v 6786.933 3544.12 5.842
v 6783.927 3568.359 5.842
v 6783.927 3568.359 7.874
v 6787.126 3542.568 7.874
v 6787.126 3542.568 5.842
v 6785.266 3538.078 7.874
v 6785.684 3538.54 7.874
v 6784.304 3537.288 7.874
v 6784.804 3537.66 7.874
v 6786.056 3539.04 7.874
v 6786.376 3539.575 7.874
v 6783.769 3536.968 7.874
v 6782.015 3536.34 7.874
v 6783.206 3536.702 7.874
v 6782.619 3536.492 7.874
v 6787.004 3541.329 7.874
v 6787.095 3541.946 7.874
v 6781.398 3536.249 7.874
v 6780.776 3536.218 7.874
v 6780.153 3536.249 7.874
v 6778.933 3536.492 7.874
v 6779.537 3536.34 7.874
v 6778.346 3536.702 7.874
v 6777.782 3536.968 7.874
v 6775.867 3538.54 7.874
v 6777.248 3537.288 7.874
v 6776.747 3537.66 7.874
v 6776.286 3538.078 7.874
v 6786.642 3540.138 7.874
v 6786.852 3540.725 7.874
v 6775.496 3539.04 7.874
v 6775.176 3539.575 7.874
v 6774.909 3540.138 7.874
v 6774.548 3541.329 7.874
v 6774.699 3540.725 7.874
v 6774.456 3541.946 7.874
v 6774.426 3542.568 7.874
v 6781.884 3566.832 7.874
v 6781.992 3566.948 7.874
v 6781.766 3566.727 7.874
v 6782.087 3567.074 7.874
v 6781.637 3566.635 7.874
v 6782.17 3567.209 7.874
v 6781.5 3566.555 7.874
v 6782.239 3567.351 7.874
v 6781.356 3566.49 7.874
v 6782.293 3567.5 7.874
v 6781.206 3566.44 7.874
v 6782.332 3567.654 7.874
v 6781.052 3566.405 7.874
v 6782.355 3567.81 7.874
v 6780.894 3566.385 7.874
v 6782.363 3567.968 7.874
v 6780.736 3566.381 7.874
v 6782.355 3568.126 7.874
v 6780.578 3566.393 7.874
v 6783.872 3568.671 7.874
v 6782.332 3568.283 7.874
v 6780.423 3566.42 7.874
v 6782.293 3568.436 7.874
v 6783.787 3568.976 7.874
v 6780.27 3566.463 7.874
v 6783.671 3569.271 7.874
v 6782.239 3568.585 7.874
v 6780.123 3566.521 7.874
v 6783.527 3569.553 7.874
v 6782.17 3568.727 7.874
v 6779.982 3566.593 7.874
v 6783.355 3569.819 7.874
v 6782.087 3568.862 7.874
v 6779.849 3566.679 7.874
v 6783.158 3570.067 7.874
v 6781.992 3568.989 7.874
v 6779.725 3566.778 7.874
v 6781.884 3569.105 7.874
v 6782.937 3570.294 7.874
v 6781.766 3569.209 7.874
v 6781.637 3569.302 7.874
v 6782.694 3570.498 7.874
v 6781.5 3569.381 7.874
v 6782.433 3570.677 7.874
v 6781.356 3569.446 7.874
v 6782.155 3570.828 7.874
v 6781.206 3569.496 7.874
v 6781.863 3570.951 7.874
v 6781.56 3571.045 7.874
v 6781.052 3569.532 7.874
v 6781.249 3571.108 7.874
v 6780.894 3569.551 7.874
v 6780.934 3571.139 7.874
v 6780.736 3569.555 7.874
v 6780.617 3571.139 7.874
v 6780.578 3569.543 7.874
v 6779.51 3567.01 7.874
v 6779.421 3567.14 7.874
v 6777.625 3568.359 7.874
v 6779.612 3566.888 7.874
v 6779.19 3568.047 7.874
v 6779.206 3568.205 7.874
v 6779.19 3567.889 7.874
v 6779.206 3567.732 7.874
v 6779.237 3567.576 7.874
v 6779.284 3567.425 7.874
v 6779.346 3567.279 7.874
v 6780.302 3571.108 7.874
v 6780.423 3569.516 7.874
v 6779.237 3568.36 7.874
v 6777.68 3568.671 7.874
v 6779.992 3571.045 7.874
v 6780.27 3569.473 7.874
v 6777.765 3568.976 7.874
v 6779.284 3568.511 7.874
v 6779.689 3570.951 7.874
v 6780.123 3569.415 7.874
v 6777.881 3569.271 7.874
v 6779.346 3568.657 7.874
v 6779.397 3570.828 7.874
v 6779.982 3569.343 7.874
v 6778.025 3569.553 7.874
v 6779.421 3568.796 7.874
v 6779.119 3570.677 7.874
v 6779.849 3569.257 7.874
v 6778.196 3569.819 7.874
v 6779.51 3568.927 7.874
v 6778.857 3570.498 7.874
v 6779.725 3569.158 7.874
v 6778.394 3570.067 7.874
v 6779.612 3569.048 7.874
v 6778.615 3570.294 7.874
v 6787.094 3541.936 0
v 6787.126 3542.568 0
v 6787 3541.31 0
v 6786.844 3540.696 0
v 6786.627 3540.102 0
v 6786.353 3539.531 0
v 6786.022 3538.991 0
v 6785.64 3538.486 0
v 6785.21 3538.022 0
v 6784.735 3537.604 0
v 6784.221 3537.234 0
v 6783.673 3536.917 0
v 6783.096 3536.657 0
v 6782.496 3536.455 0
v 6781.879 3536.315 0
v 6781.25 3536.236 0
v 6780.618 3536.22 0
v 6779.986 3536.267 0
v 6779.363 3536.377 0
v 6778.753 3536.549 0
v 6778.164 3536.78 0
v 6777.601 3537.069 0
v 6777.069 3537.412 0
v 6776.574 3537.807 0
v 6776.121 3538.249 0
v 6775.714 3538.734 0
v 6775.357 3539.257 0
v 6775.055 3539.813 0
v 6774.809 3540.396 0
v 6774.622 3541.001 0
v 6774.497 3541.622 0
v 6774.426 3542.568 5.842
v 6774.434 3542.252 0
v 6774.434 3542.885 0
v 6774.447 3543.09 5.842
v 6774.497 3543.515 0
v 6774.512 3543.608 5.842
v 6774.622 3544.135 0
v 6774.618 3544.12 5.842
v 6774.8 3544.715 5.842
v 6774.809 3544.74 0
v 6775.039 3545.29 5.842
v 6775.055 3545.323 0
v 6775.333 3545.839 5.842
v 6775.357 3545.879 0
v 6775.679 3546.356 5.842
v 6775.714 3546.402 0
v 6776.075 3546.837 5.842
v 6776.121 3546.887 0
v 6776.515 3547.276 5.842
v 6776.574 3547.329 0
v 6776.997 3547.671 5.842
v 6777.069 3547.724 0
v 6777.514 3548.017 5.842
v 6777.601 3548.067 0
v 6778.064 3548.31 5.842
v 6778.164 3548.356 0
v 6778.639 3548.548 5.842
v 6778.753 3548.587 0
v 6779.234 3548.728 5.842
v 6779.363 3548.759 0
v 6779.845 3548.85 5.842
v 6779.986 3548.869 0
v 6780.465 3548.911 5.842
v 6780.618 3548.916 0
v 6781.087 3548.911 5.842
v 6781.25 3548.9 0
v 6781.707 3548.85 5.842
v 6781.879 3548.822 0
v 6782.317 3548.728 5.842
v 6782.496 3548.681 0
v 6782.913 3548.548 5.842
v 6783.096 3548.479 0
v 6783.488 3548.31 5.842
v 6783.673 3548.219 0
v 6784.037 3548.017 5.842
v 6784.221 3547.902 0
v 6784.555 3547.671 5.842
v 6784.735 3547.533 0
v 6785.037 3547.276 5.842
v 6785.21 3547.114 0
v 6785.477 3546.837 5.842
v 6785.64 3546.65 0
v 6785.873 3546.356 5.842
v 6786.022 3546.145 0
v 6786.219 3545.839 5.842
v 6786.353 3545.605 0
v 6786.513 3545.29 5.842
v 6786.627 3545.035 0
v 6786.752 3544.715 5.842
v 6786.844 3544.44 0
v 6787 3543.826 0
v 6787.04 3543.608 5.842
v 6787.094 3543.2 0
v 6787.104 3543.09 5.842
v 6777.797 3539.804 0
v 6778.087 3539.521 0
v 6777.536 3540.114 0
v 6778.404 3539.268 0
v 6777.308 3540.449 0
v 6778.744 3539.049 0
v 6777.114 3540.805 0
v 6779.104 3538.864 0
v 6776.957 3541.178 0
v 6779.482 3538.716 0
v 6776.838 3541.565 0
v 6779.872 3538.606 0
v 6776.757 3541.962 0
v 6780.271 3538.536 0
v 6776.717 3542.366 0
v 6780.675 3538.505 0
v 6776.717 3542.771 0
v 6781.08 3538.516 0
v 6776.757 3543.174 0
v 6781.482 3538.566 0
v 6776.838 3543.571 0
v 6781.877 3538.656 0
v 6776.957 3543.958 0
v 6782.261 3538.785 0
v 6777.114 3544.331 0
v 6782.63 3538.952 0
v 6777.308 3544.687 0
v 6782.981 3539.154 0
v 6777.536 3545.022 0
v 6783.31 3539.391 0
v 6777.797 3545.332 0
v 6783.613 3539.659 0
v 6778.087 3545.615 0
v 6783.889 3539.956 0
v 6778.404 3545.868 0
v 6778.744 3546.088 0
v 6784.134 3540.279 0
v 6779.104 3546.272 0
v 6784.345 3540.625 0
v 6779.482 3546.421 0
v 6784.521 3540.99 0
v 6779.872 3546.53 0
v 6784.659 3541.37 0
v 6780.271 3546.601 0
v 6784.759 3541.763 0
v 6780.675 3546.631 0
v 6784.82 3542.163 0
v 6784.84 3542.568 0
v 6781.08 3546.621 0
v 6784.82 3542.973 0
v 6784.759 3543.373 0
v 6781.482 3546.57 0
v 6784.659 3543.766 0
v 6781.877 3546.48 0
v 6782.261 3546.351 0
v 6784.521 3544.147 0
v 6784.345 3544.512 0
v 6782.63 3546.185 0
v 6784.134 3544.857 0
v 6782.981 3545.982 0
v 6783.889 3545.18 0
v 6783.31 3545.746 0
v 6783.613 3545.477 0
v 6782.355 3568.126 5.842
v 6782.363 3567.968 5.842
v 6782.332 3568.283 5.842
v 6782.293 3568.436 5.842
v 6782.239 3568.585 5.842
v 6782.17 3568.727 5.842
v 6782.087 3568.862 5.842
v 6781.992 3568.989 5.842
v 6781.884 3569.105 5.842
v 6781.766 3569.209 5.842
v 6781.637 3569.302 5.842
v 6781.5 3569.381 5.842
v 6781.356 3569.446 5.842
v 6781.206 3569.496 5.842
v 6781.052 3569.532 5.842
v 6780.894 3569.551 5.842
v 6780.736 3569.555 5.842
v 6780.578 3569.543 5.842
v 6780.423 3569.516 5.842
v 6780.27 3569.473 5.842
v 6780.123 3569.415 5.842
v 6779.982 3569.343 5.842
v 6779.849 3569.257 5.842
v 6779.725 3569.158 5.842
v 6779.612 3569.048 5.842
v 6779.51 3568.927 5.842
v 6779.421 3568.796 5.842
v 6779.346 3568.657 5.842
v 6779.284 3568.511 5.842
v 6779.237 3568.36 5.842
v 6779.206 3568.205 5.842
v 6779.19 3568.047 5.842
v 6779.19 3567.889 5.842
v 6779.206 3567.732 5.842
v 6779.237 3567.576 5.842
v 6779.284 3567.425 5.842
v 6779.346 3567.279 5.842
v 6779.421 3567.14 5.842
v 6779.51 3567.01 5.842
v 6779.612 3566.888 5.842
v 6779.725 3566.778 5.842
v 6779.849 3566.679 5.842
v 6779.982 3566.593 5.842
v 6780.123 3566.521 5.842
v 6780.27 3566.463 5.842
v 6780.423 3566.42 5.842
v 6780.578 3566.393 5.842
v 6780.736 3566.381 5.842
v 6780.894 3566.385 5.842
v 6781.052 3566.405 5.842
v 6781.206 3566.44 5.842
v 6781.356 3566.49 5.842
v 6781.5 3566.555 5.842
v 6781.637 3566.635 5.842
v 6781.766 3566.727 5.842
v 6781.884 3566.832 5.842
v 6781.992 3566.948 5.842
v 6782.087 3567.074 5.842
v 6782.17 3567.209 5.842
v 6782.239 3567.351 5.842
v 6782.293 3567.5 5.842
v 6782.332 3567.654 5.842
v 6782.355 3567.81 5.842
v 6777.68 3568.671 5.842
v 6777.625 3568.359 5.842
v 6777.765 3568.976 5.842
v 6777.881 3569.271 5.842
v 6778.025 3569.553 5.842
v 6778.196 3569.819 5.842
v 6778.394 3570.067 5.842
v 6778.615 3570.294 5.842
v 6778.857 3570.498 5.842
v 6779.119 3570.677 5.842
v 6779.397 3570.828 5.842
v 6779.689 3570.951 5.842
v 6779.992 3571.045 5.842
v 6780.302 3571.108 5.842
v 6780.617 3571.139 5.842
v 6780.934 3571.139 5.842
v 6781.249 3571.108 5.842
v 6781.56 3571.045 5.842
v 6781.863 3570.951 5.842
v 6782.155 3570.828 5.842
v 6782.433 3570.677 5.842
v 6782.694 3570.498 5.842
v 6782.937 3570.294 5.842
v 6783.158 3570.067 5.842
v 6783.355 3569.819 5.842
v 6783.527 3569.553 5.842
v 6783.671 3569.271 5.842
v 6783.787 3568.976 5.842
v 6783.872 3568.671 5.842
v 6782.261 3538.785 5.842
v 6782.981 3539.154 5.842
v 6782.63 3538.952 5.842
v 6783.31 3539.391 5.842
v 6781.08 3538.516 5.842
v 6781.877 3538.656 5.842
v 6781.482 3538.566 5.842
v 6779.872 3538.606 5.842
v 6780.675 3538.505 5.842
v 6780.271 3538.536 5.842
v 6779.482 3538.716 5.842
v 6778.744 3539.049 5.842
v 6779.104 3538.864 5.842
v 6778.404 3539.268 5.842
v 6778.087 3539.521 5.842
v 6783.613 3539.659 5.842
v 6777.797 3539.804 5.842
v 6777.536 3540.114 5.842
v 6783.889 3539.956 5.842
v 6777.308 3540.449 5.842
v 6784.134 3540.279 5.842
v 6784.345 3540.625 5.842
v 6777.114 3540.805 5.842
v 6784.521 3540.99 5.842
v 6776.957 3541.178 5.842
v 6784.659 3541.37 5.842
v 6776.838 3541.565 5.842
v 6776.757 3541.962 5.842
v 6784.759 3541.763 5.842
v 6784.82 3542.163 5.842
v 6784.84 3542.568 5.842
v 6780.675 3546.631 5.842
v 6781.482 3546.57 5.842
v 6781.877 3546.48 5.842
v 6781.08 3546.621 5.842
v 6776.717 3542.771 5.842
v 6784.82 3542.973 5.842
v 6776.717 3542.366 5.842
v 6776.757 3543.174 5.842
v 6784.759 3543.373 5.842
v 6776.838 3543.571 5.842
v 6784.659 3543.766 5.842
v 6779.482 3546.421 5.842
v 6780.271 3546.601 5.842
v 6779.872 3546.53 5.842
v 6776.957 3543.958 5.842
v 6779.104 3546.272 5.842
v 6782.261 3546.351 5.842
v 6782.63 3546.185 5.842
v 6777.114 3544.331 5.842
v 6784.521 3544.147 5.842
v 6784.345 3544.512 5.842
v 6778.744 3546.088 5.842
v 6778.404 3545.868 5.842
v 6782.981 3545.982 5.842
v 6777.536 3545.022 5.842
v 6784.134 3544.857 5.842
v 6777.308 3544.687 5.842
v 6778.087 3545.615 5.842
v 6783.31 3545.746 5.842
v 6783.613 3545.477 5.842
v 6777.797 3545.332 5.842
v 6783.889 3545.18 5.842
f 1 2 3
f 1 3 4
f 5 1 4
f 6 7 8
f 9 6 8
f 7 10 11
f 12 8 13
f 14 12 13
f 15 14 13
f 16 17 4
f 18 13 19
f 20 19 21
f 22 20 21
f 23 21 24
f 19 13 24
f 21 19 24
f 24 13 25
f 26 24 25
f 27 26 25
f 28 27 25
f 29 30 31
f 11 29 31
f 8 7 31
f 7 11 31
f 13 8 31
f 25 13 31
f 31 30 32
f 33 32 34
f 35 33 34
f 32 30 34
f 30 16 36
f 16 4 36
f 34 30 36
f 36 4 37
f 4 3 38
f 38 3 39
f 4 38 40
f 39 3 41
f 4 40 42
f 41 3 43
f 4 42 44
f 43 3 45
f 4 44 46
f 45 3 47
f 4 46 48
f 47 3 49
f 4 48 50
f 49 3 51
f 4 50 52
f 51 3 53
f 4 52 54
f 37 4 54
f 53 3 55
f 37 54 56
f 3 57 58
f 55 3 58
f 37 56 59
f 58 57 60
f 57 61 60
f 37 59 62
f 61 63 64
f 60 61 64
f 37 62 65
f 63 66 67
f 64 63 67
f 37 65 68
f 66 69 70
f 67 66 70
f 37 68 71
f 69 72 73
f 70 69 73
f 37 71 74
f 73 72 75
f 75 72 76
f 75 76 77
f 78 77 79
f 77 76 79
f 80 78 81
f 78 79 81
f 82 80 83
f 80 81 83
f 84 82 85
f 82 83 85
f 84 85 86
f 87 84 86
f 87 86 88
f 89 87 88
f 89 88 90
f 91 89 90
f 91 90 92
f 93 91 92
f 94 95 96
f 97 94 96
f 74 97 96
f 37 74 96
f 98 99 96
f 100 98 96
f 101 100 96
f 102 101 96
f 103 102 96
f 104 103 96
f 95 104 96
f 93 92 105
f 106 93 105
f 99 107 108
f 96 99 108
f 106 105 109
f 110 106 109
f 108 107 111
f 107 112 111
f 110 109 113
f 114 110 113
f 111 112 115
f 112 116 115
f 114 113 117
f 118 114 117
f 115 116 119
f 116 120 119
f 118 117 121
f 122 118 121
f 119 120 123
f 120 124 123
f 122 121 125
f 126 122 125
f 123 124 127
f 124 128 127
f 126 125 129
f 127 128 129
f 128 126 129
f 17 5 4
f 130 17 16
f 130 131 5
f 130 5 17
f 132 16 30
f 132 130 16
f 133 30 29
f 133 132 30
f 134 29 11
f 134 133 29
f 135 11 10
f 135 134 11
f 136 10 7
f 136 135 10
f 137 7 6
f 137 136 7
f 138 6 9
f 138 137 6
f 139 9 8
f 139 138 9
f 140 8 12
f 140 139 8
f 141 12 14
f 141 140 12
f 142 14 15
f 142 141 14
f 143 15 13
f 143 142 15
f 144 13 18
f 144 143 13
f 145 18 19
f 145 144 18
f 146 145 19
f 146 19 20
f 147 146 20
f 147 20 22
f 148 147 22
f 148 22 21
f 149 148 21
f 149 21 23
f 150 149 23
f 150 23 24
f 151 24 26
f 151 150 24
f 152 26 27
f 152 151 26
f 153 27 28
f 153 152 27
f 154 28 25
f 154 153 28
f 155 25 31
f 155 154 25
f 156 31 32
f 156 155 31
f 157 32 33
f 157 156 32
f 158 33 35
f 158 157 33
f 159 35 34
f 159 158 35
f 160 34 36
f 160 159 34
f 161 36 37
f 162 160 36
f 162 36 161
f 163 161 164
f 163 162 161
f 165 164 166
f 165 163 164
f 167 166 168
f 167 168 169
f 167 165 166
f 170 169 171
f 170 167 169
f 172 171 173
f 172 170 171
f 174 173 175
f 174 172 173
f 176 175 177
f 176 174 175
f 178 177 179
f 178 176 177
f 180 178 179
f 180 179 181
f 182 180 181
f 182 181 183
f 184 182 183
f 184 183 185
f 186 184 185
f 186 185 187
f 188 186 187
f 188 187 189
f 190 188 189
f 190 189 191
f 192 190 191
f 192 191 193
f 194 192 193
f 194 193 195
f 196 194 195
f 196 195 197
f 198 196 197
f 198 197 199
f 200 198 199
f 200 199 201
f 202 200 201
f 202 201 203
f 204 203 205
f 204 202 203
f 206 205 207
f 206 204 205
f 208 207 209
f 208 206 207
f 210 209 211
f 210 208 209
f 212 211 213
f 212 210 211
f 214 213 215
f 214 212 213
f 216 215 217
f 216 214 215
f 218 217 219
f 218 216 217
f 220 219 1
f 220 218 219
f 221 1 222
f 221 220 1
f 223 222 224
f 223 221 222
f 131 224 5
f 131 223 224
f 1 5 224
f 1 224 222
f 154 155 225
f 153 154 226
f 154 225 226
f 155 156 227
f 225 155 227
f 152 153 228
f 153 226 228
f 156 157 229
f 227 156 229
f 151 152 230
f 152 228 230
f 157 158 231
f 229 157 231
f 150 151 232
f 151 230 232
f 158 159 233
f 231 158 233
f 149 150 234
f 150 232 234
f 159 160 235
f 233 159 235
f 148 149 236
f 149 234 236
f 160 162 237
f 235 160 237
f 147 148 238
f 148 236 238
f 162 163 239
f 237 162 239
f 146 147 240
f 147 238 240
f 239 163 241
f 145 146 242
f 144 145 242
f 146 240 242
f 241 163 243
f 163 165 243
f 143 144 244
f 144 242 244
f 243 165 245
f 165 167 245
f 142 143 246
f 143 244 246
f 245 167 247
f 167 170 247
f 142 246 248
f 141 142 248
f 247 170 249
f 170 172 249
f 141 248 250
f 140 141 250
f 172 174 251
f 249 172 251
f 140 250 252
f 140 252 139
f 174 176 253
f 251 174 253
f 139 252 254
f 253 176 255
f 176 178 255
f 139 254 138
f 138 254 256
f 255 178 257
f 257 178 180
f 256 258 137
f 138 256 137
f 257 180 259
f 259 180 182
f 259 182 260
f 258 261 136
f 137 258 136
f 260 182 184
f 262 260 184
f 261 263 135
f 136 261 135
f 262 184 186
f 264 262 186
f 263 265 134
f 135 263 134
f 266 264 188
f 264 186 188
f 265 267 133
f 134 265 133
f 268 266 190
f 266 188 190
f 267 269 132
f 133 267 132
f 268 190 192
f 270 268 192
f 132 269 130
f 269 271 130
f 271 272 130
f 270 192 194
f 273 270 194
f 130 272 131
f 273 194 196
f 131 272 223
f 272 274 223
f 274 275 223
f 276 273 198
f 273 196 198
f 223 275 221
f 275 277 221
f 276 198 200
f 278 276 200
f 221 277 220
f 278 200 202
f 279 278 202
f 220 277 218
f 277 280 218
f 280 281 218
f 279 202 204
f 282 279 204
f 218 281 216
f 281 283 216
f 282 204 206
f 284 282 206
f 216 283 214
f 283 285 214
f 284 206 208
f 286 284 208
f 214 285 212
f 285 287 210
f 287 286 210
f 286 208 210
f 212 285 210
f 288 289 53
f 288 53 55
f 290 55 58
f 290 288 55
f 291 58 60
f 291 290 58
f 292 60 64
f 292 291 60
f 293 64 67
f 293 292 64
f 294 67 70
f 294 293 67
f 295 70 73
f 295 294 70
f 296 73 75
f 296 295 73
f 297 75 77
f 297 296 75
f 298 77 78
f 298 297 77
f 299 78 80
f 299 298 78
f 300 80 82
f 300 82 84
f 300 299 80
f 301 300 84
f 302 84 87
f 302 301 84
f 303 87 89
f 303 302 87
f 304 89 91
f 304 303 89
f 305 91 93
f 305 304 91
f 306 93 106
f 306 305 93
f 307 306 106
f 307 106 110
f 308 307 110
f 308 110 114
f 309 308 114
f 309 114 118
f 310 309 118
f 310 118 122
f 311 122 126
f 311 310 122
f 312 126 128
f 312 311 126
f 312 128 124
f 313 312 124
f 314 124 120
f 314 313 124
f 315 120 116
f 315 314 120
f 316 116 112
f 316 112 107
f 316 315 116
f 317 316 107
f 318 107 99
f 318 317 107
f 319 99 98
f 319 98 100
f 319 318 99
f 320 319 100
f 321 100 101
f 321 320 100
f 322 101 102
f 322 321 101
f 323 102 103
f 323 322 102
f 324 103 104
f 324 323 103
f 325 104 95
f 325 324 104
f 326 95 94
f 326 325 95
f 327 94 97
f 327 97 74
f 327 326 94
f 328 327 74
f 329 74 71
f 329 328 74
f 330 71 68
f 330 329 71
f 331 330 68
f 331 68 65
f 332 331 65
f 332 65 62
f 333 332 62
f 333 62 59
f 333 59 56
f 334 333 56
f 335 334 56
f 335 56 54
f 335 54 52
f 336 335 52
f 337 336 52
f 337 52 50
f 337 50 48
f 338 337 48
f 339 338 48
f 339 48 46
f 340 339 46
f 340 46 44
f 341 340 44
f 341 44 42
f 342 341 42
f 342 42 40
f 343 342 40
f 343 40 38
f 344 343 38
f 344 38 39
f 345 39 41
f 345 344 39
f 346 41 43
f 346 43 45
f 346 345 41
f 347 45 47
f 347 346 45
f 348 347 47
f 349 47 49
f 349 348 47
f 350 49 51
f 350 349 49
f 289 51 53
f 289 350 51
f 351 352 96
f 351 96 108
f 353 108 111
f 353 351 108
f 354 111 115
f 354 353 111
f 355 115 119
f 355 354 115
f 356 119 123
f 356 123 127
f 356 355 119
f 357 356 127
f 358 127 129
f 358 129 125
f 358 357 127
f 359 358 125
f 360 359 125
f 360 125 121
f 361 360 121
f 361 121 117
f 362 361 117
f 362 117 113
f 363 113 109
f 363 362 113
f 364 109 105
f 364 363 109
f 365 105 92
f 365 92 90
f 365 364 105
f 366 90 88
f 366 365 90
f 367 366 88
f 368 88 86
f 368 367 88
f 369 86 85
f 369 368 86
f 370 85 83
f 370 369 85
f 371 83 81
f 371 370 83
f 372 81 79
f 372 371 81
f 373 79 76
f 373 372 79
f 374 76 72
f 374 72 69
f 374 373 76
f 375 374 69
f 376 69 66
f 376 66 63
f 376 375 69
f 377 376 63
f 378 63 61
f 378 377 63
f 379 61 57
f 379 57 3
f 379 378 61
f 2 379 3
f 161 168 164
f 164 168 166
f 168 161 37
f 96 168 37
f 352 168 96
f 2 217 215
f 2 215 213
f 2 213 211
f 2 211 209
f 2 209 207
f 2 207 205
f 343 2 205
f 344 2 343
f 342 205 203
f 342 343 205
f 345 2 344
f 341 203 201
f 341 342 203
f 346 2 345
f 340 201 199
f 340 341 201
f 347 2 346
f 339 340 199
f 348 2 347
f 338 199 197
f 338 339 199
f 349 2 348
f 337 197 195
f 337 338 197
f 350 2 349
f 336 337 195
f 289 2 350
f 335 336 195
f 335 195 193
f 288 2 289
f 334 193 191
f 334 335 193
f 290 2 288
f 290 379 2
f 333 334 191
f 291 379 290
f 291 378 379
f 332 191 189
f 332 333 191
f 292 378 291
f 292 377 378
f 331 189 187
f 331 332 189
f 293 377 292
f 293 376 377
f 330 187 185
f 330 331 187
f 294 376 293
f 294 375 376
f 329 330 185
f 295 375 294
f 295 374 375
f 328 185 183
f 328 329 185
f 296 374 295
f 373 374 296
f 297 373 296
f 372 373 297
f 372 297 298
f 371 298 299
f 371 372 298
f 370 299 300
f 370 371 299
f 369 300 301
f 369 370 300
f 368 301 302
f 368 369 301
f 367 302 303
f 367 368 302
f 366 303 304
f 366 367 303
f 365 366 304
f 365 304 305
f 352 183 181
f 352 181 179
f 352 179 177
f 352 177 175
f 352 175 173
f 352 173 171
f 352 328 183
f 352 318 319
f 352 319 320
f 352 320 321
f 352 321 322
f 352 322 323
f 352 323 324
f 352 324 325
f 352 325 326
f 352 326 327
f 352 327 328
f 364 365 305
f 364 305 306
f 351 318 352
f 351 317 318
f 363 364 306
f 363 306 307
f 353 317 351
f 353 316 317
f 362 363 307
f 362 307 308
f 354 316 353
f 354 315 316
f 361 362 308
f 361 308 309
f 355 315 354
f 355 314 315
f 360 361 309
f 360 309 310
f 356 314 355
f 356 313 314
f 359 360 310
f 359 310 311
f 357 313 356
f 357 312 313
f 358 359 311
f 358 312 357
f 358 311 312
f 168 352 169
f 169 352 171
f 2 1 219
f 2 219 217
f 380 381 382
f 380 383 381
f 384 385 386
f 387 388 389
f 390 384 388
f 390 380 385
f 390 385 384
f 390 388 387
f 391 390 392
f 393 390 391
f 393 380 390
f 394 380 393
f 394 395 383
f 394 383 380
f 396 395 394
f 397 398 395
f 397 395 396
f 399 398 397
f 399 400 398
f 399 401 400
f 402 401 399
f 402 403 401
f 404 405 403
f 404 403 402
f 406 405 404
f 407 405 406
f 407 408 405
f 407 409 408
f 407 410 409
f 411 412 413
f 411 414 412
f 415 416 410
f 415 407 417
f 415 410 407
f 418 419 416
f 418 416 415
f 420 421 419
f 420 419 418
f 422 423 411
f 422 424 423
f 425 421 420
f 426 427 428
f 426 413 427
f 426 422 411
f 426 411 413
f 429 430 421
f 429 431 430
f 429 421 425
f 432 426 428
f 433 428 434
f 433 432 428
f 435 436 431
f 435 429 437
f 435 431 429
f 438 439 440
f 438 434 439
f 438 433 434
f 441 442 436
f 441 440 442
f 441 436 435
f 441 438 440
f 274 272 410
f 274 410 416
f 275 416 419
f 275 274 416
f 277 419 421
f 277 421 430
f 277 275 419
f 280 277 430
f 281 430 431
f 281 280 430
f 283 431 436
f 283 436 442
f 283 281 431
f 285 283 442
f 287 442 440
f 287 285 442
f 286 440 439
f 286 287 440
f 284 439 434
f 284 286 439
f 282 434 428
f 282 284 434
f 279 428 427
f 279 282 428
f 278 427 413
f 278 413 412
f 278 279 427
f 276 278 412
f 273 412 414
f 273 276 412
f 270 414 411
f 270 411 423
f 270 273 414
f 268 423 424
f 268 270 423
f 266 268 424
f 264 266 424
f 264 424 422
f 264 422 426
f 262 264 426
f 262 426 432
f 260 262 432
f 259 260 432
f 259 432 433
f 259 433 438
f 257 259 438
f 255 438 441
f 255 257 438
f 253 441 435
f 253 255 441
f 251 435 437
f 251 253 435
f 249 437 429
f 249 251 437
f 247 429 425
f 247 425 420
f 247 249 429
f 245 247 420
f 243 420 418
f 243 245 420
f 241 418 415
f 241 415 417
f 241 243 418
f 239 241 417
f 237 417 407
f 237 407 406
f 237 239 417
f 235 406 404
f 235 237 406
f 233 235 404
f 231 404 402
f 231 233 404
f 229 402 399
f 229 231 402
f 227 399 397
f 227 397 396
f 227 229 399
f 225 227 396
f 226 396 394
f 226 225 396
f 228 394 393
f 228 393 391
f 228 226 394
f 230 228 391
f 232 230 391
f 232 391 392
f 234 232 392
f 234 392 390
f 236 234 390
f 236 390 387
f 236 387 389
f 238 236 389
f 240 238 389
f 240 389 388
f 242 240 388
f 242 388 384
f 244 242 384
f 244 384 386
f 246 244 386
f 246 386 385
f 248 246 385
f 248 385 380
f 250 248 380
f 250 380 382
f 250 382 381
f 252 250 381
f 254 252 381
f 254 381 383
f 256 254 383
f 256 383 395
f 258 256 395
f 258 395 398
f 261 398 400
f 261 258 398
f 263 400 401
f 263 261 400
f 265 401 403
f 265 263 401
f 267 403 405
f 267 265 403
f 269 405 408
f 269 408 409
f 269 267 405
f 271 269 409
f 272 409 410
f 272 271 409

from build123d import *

# Parameters (mm, degrees)
SKETCH1_R           = 6.35
SKETCH1_R_2         = 4.064
BOSS_EXTRUDE1_DEPTH = 5.842
SKETCH2_R           = 1.5875
BOSS_EXTRUDE2_DEPTH = 2.032


with BuildPart() as part:
    # Sketch1 → Boss-Extrude1 (new body)
    with BuildSketch(Plane.XY):
        with Locations((6780.775840345, 3542.568139787)):
            Circle(SKETCH1_R)
        with Locations((6780.775840345, 3542.568139787)):
            Circle(SKETCH1_R_2, mode=Mode.SUBTRACT)
    extrude(amount=BOSS_EXTRUDE1_DEPTH)

    # Sketch2 → Boss-Extrude2 (add)
    with BuildSketch(Plane.XY.offset(5.842)):
        with BuildLine():
            Line((6774.425840345, 3542.568139787), (6777.624987986, 3568.358977876))
            ThreePointArc((6777.624987986, 3568.358977876), (6780.775840345, 3571.143139787), (6783.926692704, 3568.358977876))
            Line((6783.926692704, 3568.358977876), (6787.125840345, 3542.568139787))
            ThreePointArc((6787.125840345, 3542.568139787), (6780.775840345, 3536.218139787), (6774.425840345, 3542.568139787))
        make_face()
        with Locations((6780.775840345, 3567.968139787)):
            Circle(SKETCH2_R, mode=Mode.SUBTRACT)
    extrude(amount=BOSS_EXTRUDE2_DEPTH)


solid = part.part
